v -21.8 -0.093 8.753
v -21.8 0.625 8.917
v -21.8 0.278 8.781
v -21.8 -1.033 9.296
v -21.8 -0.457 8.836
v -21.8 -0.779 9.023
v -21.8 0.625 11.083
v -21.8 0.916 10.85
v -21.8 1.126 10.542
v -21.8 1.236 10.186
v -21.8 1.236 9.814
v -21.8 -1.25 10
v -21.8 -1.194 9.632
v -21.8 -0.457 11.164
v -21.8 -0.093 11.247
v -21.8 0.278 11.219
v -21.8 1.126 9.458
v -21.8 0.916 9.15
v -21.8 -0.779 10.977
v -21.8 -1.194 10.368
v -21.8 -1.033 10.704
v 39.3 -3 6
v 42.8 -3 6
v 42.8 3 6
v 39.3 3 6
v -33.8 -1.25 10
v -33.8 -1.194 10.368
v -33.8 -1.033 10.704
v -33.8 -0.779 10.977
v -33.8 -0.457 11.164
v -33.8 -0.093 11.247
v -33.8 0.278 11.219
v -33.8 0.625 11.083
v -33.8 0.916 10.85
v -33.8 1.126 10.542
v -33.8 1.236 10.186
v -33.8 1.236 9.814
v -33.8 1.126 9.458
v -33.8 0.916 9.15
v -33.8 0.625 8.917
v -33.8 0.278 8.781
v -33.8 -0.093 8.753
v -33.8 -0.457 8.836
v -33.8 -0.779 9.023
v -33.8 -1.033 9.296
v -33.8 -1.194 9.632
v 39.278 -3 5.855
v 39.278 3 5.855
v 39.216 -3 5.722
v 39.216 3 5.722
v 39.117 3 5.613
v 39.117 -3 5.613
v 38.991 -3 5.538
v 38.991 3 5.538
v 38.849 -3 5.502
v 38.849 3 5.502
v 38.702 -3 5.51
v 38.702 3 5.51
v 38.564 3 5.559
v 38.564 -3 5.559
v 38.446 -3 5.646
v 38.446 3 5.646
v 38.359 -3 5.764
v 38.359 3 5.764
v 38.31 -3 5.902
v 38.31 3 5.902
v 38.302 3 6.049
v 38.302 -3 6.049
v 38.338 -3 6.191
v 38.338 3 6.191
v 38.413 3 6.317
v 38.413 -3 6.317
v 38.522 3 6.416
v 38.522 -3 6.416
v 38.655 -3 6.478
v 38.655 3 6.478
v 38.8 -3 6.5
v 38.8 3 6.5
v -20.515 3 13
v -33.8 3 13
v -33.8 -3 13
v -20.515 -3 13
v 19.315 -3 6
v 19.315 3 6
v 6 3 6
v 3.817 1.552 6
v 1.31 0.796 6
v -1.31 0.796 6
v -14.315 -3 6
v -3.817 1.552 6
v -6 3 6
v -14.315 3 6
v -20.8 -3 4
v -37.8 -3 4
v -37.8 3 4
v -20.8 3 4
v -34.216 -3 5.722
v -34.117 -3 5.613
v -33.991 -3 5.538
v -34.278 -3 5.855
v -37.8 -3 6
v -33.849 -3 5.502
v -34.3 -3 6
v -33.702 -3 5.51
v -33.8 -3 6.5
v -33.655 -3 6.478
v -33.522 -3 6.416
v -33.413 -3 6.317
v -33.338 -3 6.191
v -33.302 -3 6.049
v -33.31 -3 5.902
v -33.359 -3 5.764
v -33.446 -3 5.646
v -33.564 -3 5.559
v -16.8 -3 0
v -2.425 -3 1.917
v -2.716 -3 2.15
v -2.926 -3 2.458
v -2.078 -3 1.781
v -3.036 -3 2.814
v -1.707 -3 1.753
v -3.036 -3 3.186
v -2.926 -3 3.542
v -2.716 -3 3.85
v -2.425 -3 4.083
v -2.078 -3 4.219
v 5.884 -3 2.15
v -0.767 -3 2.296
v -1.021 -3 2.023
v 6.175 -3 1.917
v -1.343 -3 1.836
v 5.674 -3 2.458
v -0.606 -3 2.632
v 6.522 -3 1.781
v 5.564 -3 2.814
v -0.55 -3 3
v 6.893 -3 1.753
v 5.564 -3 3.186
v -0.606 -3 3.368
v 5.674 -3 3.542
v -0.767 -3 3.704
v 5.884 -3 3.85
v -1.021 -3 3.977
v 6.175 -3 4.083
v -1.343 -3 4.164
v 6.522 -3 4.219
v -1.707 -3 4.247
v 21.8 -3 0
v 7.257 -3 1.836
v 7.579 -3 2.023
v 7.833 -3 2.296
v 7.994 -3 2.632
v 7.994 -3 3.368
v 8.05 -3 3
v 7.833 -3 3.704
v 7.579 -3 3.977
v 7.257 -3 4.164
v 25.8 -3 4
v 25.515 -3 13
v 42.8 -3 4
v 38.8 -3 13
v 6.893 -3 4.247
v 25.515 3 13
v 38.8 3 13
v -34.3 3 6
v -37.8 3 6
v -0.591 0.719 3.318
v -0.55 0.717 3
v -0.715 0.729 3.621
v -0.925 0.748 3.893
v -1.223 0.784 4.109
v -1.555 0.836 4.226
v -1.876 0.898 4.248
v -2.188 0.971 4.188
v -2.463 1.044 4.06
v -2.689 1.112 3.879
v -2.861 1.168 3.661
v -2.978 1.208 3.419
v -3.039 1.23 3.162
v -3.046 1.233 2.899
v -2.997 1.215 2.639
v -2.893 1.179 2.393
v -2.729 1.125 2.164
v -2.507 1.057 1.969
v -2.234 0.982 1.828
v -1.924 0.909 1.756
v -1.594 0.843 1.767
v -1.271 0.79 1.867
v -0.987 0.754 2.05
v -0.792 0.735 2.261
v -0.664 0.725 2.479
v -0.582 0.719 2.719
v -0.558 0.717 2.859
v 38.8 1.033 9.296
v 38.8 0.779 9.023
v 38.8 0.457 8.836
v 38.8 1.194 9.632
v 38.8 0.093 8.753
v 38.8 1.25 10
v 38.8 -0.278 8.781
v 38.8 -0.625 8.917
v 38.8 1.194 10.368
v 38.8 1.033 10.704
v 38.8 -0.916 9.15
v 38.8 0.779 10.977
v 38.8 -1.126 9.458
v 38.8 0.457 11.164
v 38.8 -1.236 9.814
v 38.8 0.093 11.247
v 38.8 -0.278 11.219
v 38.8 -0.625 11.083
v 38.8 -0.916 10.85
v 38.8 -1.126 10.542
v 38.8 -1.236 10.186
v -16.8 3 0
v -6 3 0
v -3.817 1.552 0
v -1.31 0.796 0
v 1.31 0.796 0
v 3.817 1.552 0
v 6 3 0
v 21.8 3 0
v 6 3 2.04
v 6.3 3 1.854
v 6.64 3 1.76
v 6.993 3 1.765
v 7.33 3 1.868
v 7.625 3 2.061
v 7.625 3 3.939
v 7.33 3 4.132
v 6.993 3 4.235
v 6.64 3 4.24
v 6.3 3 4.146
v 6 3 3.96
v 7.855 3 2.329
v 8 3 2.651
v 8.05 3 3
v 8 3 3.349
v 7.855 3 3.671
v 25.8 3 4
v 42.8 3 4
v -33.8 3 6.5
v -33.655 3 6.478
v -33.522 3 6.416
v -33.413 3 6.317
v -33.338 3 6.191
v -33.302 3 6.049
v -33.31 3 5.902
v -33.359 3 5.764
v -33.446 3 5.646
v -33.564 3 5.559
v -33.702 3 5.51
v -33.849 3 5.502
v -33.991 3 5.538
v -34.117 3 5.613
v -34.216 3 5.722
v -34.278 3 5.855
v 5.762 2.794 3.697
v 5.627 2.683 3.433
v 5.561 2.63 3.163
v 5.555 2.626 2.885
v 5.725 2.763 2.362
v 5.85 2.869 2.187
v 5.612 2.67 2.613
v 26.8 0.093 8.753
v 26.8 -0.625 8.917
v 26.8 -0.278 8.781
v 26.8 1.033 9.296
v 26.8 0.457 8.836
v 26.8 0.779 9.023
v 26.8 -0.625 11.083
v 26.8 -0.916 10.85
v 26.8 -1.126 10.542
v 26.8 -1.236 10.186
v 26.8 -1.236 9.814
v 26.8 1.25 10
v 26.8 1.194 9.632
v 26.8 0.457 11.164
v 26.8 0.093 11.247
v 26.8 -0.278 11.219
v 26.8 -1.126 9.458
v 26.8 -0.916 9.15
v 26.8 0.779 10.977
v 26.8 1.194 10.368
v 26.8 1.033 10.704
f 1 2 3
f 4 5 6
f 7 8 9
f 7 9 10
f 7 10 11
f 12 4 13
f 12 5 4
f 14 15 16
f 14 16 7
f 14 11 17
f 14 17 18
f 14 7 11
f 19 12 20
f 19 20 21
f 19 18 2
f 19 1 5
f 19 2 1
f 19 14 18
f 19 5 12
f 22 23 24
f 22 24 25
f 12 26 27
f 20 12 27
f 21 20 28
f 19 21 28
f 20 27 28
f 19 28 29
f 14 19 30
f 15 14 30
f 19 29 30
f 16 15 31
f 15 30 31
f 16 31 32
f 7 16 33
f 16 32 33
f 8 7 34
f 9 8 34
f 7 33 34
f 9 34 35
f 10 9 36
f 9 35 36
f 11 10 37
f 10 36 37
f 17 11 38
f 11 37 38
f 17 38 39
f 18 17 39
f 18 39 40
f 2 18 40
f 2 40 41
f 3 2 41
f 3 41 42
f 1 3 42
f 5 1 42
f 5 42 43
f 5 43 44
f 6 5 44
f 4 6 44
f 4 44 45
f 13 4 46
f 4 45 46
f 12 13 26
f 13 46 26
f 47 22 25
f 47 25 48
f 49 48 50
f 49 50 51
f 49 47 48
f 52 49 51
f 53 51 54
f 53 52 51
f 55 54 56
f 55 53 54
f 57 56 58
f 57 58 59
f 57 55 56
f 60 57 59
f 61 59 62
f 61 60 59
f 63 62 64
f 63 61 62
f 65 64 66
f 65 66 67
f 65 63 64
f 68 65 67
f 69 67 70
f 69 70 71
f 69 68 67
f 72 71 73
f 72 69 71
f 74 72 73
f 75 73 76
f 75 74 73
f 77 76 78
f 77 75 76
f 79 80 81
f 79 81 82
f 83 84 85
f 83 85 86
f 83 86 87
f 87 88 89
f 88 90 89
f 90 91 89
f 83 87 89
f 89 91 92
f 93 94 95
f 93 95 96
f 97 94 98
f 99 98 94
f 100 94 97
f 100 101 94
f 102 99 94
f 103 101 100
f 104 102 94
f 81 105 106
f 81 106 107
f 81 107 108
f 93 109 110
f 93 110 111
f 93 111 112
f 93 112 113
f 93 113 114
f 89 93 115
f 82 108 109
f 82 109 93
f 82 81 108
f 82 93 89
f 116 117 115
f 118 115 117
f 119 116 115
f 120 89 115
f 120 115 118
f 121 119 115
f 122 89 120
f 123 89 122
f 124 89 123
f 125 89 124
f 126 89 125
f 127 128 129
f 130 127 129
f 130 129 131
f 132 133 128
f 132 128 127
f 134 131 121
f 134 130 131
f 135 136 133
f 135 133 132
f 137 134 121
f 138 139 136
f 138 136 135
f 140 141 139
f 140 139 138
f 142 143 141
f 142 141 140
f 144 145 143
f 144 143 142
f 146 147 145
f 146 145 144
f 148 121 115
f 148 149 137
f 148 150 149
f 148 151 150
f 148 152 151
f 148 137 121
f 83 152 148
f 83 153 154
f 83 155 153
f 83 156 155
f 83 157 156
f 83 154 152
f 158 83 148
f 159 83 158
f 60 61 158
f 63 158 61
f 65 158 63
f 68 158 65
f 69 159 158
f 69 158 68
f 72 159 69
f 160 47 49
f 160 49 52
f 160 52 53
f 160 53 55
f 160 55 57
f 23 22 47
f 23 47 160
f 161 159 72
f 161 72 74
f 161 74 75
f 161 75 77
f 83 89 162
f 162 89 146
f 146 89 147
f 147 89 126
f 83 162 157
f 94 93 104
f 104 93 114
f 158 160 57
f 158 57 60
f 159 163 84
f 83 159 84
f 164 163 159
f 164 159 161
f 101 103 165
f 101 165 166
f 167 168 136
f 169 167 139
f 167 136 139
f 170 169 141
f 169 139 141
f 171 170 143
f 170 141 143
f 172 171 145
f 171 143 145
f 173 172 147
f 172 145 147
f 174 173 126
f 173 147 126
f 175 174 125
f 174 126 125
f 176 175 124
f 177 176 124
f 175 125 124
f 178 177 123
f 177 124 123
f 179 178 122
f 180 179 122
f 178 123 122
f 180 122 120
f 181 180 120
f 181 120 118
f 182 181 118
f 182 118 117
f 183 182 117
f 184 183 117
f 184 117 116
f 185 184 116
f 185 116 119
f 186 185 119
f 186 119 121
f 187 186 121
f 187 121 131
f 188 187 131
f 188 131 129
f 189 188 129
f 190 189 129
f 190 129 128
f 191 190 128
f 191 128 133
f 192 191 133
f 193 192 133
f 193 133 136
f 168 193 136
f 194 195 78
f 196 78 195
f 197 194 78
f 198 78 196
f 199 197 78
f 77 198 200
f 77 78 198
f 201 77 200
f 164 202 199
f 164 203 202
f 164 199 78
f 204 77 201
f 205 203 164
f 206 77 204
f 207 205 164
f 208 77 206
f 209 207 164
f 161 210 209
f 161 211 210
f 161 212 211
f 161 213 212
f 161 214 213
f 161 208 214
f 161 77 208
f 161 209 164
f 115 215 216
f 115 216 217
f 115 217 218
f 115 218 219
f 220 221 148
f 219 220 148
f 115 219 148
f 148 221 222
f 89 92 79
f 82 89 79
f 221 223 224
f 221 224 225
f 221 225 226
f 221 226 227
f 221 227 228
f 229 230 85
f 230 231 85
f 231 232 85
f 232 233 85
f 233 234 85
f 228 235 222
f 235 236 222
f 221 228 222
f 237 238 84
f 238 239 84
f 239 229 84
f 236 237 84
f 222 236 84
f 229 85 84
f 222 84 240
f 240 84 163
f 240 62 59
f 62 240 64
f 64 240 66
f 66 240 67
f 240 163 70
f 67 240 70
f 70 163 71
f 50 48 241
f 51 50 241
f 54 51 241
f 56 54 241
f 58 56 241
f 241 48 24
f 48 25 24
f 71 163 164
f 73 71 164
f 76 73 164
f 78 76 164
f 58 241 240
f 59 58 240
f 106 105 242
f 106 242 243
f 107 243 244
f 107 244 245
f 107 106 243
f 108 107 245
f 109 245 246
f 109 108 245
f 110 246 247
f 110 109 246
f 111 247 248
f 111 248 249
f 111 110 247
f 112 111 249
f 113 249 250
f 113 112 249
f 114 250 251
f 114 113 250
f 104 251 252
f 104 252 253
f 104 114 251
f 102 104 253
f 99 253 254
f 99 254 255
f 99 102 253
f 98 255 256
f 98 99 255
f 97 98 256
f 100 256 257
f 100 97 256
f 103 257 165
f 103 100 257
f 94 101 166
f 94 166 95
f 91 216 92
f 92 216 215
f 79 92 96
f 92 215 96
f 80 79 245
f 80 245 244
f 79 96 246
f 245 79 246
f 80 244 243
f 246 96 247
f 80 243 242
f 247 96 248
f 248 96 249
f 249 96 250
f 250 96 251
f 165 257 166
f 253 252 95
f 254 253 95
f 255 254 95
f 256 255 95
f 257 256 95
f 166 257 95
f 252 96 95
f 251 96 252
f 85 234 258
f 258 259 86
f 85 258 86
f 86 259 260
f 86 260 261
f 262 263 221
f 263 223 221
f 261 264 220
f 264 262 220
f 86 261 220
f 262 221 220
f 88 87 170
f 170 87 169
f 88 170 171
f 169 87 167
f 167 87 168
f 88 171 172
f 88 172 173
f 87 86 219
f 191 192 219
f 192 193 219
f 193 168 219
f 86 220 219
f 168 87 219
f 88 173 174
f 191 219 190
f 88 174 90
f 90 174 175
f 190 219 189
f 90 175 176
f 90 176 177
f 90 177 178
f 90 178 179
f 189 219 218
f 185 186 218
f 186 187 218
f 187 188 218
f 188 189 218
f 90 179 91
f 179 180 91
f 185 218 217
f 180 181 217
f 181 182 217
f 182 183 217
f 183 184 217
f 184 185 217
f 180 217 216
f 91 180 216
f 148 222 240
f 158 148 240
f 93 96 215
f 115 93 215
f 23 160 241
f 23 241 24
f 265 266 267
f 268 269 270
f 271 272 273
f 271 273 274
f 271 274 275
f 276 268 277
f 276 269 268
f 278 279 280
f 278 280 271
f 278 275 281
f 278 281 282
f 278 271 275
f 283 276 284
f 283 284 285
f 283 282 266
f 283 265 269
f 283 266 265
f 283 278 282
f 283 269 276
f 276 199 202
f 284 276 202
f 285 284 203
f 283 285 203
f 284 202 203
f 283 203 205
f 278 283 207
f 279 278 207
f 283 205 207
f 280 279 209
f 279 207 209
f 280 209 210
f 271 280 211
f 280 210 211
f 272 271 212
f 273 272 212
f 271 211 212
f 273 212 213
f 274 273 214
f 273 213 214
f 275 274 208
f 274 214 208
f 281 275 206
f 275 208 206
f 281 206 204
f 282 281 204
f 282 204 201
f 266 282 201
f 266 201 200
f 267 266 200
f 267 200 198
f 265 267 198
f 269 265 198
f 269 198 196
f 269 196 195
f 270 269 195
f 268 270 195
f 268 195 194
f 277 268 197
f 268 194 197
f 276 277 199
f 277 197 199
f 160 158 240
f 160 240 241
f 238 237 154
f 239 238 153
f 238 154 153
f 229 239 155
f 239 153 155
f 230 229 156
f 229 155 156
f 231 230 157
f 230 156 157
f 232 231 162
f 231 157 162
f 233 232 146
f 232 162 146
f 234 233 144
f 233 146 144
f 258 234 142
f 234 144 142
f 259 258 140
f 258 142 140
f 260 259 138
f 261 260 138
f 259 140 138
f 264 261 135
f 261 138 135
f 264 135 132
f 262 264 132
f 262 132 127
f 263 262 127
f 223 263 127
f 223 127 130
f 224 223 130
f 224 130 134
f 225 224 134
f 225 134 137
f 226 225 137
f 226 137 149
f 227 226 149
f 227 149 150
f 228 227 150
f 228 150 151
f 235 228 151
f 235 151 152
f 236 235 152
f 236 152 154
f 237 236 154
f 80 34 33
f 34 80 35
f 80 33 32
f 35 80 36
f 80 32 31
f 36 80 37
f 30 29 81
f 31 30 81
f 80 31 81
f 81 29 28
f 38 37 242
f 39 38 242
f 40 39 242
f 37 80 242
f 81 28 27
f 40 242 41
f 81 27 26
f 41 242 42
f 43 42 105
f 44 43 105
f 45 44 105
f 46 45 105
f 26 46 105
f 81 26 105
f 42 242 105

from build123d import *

# Parameters (mm, degrees)
F1_DEPTH  = 13
F2_W      = 10
F2_H      = 7
F3_DEPTH  = 6.001
F5_DEPTH  = 13.001
F6_R      = 1.25
F7_DEPTH  = 12
F8_R      = 1.25
F9_DEPTH  = 12
F10_R     = 1.25
F11_DEPTH = 6.001
F13_DEPTH = 6


with BuildPart() as f1:
    # F0 (on Top) → F1 (new body)
    with BuildSketch(Plane.XY):
        Polygon((38.8, 3), (-33.8, 3), (-33.8, -3), (-6, -3), (6, -3), (38.8, -3), align=None)
    extrude(amount=F1_DEPTH)

    # F2 (on face) → F3 (cut, through all)
    with BuildSketch(Plane(origin=(0, 3, 0), x_dir=(-1, 0, 0), z_dir=(0, 1, 0))):
        Polygon((-28.8, 7), (-28.8, 0), (-21.8, 0), align=None)
        with Locations((-33.8, 3.5)):
            Rectangle(F2_W, F2_H)
        Polygon((20.5147186258, 13), (-25.5147186258, 13), (-19.3147186258, 6), (14.3147186258, 6), align=None)
        Polygon((23.8, 7), (16.8, 0), (23.8, 0), align=None)
        with Locations((28.8, 3.5)):
            Rectangle(F2_W, F2_H)
    extrude(amount=-F3_DEPTH, mode=Mode.SUBTRACT)

    # F4 (on face) → F5 (cut, through all)
    with BuildSketch(Plane(origin=(0, 0, 0), x_dir=(1, 0, 0), z_dir=(0, 0, -1))):
        with BuildLine():
            Line((-6, -3), (6, -3))
            ThreePointArc((6, -3), (0, -0.7), (-6, -3))
        make_face()
    extrude(amount=-F5_DEPTH, mode=Mode.SUBTRACT)

    # F6 (on face) → F7 (cut)
    with BuildSketch(Plane.YZ.offset(38.8)):
        with Locations((0, 10)):
            Circle(F6_R)
    extrude(amount=-F7_DEPTH, mode=Mode.SUBTRACT)

    # F8 (on face) → F9 (cut)
    with BuildSketch(Plane(origin=(-33.8, 0, 0), x_dir=(0, -1, 0), z_dir=(-1, 0, 0))):
        with Locations((0, 10)):
            Circle(F8_R)
    extrude(amount=-F9_DEPTH, mode=Mode.SUBTRACT)

    # F10 (on face) → F11 (cut, through all)
    with BuildSketch(Plane.XZ.offset(3)):
        with Locations((-1.8, 3)):
            Circle(F10_R)
        with Locations((6.8, 3)):
            Circle(F10_R)
    extrude(amount=-F11_DEPTH, mode=Mode.SUBTRACT)

    # F12 (on face) → F13 (join)
    with BuildSketch(Plane.XZ.offset(3)):
        with BuildLine():
            Line((38.8, 6.5), (38.8, 7))
            Line((38.8, 7), (28.8, 7))
            Line((28.8, 7), (25.8, 4))
            Line((25.8, 4), (42.8, 4))
            Line((42.8, 4), (42.8, 6))
            Line((42.8, 6), (39.3, 6))
            ThreePointArc((39.3, 6), (38.4464466094, 5.6464466094), (38.8, 6.5))
        make_face()
        with BuildLine():
            Line((-37.8, 4), (-20.8, 4))
            Line((-20.8, 4), (-23.8, 7))
            Line((-23.8, 7), (-33.8, 7))
            Line((-33.8, 7), (-33.8, 6.5))
            ThreePointArc((-33.8, 6.5), (-33.4464466094, 5.6464466094), (-34.3, 6))
            Line((-34.3, 6), (-37.8, 6))
            Line((-37.8, 6), (-37.8, 4))
        make_face()
    extrude(amount=-F13_DEPTH)


solid = f1.part
